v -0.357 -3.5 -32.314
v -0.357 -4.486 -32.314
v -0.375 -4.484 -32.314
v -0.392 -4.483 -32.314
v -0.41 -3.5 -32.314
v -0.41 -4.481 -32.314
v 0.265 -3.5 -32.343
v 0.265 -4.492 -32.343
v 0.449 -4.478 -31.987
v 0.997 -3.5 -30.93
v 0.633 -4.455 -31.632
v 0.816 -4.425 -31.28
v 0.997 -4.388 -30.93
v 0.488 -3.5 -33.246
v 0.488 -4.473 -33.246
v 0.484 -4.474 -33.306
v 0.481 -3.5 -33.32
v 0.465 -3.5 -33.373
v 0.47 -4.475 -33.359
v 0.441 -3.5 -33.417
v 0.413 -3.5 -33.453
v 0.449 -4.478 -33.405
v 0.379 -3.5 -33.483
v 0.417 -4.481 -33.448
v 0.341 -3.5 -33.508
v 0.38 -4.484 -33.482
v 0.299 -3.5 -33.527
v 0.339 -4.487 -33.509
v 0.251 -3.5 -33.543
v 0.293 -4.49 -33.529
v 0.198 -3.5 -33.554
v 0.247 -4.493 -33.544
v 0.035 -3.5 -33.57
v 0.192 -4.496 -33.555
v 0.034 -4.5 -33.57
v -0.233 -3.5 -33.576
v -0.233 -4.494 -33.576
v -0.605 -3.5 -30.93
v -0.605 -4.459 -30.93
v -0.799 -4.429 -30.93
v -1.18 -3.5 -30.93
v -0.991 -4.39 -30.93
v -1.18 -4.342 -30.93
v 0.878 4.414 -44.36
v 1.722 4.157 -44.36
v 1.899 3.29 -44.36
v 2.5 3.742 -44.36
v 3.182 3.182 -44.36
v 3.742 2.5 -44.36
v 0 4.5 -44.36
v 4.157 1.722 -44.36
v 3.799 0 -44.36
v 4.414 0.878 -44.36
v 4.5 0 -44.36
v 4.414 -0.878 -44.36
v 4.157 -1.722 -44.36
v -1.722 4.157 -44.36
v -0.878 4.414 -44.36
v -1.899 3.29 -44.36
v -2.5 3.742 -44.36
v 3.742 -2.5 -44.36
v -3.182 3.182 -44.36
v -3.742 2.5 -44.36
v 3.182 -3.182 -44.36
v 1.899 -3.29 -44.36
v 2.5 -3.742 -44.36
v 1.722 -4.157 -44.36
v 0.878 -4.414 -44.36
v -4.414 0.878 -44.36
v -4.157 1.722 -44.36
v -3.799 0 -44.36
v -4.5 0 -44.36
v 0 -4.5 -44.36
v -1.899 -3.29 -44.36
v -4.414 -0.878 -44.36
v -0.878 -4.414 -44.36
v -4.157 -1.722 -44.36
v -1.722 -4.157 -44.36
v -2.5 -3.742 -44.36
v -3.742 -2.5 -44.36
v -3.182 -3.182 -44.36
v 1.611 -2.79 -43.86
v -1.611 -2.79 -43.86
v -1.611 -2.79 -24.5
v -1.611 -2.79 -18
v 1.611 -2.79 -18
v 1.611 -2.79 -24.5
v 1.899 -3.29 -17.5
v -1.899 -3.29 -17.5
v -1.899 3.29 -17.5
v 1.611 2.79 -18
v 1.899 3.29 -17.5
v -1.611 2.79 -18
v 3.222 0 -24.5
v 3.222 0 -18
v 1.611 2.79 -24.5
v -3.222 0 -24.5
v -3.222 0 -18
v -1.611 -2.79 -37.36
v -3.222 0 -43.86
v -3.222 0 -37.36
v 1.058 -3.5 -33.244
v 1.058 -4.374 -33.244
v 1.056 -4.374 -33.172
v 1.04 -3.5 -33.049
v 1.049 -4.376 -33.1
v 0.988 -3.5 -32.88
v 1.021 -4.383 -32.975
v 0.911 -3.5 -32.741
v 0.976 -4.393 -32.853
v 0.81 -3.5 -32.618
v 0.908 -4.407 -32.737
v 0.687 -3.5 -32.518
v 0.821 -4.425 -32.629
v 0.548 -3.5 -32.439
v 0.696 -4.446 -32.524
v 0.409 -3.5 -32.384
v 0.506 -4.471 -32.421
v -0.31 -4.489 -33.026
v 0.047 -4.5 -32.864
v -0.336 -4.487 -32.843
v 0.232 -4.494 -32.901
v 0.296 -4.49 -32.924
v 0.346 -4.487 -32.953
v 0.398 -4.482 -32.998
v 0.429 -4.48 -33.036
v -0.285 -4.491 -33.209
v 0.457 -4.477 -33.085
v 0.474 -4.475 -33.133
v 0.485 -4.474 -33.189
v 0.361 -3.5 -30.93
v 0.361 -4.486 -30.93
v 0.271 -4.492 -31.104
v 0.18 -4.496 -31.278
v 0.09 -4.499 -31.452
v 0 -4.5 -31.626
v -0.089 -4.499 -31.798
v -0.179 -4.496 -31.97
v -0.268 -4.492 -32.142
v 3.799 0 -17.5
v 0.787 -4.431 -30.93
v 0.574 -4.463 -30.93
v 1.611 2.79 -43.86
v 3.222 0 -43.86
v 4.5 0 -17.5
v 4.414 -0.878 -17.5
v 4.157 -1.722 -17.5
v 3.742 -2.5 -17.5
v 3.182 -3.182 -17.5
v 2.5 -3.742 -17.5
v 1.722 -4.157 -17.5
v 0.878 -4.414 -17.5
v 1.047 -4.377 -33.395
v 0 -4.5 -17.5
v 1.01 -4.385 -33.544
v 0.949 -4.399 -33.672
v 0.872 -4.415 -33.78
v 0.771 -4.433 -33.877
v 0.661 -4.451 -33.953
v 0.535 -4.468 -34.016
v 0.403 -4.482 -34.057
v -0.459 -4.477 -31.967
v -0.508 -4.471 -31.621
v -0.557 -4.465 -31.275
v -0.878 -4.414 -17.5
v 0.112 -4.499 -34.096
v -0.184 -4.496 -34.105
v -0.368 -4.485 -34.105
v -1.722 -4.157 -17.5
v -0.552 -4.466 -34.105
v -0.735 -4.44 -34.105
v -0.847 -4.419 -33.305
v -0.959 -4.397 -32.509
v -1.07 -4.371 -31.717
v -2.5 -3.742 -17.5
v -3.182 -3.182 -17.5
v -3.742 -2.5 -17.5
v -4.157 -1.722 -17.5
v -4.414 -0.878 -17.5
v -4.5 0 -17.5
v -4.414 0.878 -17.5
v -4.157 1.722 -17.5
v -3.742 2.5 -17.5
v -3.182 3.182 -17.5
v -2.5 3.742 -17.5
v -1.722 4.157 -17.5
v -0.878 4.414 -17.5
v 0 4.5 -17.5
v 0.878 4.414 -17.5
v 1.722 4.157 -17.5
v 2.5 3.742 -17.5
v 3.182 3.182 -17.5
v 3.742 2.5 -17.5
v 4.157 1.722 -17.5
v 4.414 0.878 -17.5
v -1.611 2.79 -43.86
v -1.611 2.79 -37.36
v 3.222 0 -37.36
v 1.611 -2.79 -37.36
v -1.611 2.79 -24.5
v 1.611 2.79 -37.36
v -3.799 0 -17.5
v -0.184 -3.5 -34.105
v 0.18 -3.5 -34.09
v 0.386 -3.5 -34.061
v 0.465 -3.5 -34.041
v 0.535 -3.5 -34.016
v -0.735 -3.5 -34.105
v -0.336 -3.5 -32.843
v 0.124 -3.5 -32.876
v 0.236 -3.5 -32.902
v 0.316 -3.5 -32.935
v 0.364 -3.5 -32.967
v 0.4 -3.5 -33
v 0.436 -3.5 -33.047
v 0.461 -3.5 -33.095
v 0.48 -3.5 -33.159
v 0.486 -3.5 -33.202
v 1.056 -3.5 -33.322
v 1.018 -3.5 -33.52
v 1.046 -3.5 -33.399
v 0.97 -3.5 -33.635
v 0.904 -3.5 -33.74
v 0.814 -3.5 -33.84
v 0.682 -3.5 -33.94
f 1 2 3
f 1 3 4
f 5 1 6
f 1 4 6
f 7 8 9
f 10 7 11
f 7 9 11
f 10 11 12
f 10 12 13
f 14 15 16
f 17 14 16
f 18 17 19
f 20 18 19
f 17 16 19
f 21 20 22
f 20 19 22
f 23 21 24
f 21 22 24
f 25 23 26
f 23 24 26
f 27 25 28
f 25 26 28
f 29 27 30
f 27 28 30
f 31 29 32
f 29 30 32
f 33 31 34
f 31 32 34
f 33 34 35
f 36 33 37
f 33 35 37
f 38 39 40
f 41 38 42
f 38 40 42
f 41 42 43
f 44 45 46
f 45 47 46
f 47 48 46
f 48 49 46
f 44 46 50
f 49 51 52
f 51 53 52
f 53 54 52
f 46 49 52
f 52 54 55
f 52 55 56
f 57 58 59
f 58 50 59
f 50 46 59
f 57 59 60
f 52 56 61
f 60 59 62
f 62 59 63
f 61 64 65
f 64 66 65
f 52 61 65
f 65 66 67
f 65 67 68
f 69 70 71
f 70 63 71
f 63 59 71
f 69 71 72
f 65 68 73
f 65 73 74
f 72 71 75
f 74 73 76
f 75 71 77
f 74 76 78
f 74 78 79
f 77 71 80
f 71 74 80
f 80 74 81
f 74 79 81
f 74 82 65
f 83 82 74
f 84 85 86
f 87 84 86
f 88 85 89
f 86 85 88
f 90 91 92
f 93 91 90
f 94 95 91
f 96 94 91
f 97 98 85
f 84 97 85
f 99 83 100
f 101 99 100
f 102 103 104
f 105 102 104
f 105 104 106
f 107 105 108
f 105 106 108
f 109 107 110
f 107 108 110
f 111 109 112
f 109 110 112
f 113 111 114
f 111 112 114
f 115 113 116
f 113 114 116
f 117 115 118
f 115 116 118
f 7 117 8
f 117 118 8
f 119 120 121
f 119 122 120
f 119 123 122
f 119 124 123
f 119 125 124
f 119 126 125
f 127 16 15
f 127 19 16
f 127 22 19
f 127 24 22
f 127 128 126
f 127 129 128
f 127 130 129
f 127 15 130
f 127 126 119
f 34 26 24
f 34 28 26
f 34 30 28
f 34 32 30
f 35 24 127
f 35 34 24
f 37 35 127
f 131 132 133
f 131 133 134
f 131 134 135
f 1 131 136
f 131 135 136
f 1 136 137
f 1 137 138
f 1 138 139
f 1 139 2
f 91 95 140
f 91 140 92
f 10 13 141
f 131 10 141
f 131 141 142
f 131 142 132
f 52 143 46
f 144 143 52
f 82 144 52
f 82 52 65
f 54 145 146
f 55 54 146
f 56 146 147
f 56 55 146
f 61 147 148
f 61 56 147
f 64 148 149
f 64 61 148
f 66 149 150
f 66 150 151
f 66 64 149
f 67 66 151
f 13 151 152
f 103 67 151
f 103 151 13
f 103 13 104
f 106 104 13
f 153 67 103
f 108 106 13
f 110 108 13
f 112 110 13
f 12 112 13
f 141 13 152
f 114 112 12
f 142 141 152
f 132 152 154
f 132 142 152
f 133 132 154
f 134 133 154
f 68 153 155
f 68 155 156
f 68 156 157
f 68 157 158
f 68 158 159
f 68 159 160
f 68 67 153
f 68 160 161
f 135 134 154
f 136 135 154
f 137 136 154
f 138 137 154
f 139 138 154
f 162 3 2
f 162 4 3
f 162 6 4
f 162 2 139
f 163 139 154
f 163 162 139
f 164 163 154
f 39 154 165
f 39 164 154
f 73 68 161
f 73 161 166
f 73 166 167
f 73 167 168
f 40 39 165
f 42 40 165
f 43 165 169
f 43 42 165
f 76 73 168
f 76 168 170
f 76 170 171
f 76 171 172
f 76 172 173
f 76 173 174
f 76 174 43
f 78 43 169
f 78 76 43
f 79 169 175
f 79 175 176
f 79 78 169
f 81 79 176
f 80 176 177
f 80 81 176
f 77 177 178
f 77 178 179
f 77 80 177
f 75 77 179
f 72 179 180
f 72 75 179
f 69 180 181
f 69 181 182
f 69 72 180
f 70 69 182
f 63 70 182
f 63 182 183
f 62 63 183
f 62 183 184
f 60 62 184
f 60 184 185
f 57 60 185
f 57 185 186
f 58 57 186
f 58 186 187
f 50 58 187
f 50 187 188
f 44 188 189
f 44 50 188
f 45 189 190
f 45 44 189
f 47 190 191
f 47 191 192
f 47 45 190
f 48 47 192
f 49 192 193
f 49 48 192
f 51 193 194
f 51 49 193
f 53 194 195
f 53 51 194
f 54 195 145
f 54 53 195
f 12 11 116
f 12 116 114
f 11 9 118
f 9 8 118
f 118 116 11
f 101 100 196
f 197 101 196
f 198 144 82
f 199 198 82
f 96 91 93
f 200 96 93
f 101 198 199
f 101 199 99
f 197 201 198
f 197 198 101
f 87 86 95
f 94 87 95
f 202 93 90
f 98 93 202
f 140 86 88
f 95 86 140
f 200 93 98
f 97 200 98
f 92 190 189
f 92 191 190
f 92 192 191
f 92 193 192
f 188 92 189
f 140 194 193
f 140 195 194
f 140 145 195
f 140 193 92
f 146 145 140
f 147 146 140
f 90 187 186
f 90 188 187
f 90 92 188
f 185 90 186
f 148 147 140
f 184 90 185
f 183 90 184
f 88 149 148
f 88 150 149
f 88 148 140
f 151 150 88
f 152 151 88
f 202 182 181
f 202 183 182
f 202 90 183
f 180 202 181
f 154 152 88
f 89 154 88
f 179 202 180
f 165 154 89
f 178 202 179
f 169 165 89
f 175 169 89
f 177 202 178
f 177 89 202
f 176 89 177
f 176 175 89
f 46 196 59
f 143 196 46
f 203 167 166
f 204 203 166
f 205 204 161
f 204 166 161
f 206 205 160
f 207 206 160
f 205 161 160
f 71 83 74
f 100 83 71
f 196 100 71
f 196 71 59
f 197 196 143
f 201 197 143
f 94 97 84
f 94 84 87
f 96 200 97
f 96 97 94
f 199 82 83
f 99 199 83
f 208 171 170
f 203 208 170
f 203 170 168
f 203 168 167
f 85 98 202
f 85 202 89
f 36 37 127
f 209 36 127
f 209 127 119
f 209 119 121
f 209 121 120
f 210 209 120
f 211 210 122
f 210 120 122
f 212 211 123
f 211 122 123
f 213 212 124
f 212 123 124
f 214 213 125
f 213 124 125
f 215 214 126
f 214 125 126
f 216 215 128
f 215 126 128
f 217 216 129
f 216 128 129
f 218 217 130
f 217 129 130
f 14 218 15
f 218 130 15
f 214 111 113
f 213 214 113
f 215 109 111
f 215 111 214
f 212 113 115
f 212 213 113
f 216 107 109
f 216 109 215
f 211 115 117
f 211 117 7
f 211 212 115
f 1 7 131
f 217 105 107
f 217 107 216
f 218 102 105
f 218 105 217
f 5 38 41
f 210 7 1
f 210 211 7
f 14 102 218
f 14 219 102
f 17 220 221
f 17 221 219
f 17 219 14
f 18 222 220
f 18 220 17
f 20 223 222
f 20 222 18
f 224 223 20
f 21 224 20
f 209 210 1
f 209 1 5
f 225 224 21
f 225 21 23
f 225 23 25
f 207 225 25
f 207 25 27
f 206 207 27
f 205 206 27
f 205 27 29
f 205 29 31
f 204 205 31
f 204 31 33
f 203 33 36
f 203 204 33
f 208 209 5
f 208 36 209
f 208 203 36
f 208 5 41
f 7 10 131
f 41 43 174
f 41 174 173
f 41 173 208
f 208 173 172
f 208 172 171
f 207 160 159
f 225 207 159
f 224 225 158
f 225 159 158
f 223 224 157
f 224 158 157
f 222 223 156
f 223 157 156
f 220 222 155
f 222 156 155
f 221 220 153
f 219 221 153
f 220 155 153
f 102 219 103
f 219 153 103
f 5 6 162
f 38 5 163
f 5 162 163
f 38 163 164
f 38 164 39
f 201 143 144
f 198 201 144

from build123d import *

# Parameters (mm, degrees)
SKETCH1_W          = 4.5
SKETCH1_H          = 26.85997733
CUT_EXTRUDE1_DEPTH = 7
CUT_EXTRUDE2_DEPTH = 7
CHAMFER1_SIZE      = 0.5
CUT_EXTRUDE3_DEPTH = 1


with BuildPart() as part:
    # Sketch1 → Revolve-Thin1 (revolve)
    with BuildSketch(Plane(origin=(0, 0, 0), x_dir=(1, 0, 0), z_dir=(0, 1, 0))):
        with Locations((2.25, 30.929988665)):
            Rectangle(SKETCH1_W, SKETCH1_H)
    revolve(axis=Axis((0, 0, 0), (0, 0, -1)))

    # Sketch2 → Cut-Extrude1 (cut)
    with BuildSketch(Plane.XY.offset(-17.5)):
        Polygon((1.610807251, 2.79), (-1.610807251, 2.79), (-3.221614502, 0), (-1.610807251, -2.79), (1.610807251, -2.79), (3.221614502, 0), align=None)
    extrude(amount=-CUT_EXTRUDE1_DEPTH, mode=Mode.SUBTRACT)

    # Sketch3 → Cut-Extrude2 (cut)
    with BuildSketch(Plane(origin=(0, 0, -44.35997733), x_dir=(-1, 0, 0), z_dir=(0, 0, -1))):
        Polygon((1.610807251, 2.79), (-1.610807251, 2.79), (-3.221614502, 0), (-1.610807251, -2.79), (1.610807251, -2.79), (3.221614502, 0), align=None)
    extrude(amount=-CUT_EXTRUDE2_DEPTH, mode=Mode.SUBTRACT)

    # Chamfer1
    chamfer1_edges = [part.edges().sort_by_distance(p)[0] for p in [
        (2.416210877, 1.395, -17.5),
        (0, 2.79, -17.5),
        (-2.416210877, 1.395, -17.5),
        (-2.416210877, -1.395, -17.5),
        (0, -2.79, -17.5),
        (2.416210877, -1.395, -17.5),
        (-2.416210877, 1.395, -44.35997733),
        (0, 2.79, -44.35997733),
        (2.416210877, 1.395, -44.35997733),
        (2.416210877, -1.395, -44.35997733),
        (0, -2.79, -44.35997733),
        (-2.416210877, -1.395, -44.35997733),
    ]]
    chamfer(chamfer1_edges, length=CHAMFER1_SIZE)

    # Sketch4 → Cut-Extrude3 (cut)
    with BuildSketch(Plane(origin=(0, -4.5, 0), x_dir=(1, 0, 0), z_dir=(0, 1, 0))):
        with BuildLine():
            Line((-0.735236378, 34.104988665), (-0.183809095, 34.104988665))
            add(Edge.make_bspline(
                [(-0.183809095, 34.104988665), (-0.142887229, 34.104821435), (-0.063984952, 34.104498996), (0.049479088, 34.099913909), (0.153619775, 34.092996425), (0.248313279, 34.083867435), (0.333638661, 34.071201473), (0.40941848, 34.055993448), (0.47613676, 34.039057193), (0.516147477, 34.02331892), (0.534890825, 34.015946197)],
                knots=[0, 0, 0, 0, 0.000122758, 0.000236692, 0.000340599, 0.000435844, 0.000522015, 0.000599225, 0.000667726, 0.000728098, 0.000728098, 0.000728098, 0.000728098], degree=3))
            add(Edge.make_bspline(
                [(0.534890825, 34.015946197), (0.555993425, 34.006429933), (0.597245667, 33.987827142), (0.656357727, 33.95629427), (0.711711569, 33.922324809), (0.762389804, 33.884637999), (0.8094619, 33.84482071), (0.852635966, 33.802494227), (0.891564361, 33.757008969), (0.926655631, 33.709180776), (0.957858636, 33.659071505), (0.984643202, 33.606434054), (1.007803352, 33.551714066), (1.025889509, 33.49431609), (1.04092128, 33.434929127), (1.050643284, 33.373178483), (1.057485172, 33.309272455), (1.058047365, 33.265888615), (1.058333333, 33.243820796)],
                knots=[0, 0, 0, 0, 6.9431e-05, 0.000135726, 0.000200852, 0.000264074, 0.000324989, 0.000385705, 0.00044524, 0.000504393, 0.000563519, 0.000622115, 0.000681412, 0.000741551, 0.000802483, 0.00086501, 0.000928929, 0.000995103, 0.000995103, 0.000995103, 0.000995103], degree=3))
            add(Edge.make_bspline(
                [(1.058333333, 33.243820796), (1.057660809, 33.216664827), (1.056333136, 33.163054546), (1.047657842, 33.083998974), (1.031477343, 33.008136947), (1.009687089, 32.93522949), (0.982690716, 32.864804536), (0.947875359, 32.798087533), (0.907633136, 32.733916018), (0.861157476, 32.67313132), (0.809209736, 32.61517584), (0.749228296, 32.563460322), (0.684531415, 32.51450675), (0.612461254, 32.471597247), (0.53499992, 32.431738139), (0.45038063, 32.397967081), (0.360191554, 32.366801607), (0.296952619, 32.351203721), (0.264583333, 32.343219835)],
                knots=[0, 0, 0, 0, 8.1472e-05, 0.00016084, 0.000238178, 0.00031384, 0.000388957, 0.000464053, 0.000539224, 0.00061593, 0.000693367, 0.000772226, 0.000853128, 0.000936463, 0.001023502, 0.00111421, 0.001209545, 0.001309511, 0.001309511, 0.001309511, 0.001309511], degree=3))
            Line((0.264583333, 32.343219835), (0.997275641, 30.929988665))
            Line((0.997275641, 30.929988665), (0.360621995, 30.929988665))
            Line((0.360621995, 30.929988665), (-0.356805889, 32.313963024))
            Line((-0.356805889, 32.313963024), (-0.41023137, 32.313963024))
            Line((-0.41023137, 32.313963024), (-0.605488782, 30.929988665))
            Line((-0.605488782, 30.929988665), (-1.180448718, 30.929988665))
            Line((-1.180448718, 30.929988665), (-0.735236378, 34.104988665))
        make_face()
        with BuildLine():
            add(Edge.make_bspline(
                [(-0.335817308, 32.843129691), (-0.294894066, 32.843508532), (-0.2166182, 32.84423316), (-0.104827079, 32.849303715), (-0.004219131, 32.857224722), (0.08509361, 32.868749131), (0.16339231, 32.882182886), (0.230523904, 32.899038904), (0.286593934, 32.919072013), (0.332485643, 32.942831056), (0.369661123, 32.970726112), (0.40183809, 33.00049459), (0.428631207, 33.033817084), (0.450737928, 33.070134204), (0.467788114, 33.109521218), (0.480083934, 33.152244969), (0.486882391, 33.198020591), (0.487927508, 33.229595041), (0.488461538, 33.245728849)],
                knots=[0, 0, 0, 0, 0.000122766, 0.000234821, 0.000335651, 0.000425427, 0.000504898, 0.000573853, 0.000632811, 0.000683169, 0.0007282, 0.000771845, 0.000814359, 0.000856026, 0.000899036, 0.000942718, 0.000989043, 0.001037447, 0.001037447, 0.001037447, 0.001037447], degree=3))
            add(Edge.make_bspline(
                [(0.488461538, 33.245728849), (0.487770257, 33.264022258), (0.486429265, 33.299508964), (0.474830234, 33.35062006), (0.454996287, 33.39698474), (0.427122393, 33.438159863), (0.392337213, 33.474465682), (0.349901429, 33.504369125), (0.300298842, 33.527903238), (0.253836196, 33.543471254), (0.210053836, 33.552396101), (0.169082237, 33.558639509), (0.120514754, 33.564294057), (0.064292994, 33.568668304), (0.000652546, 33.571550346), (-0.070576621, 33.574306307), (-0.149461846, 33.575296954), (-0.204585812, 33.575641686), (-0.23341847, 33.575821998)],
                knots=[0, 0, 0, 0, 5.483e-05, 0.000106364, 0.000156221, 0.00020526, 0.000254739, 0.000306272, 0.000360034, 0.000418964, 0.000452769, 0.000493968, 0.000543275, 0.000599421, 0.000663102, 0.000734382, 0.000813258, 0.000899759, 0.000899759, 0.000899759, 0.000899759], degree=3))
            Line((-0.23341847, 33.575821998), (-0.335817308, 32.843129691))
        make_face(mode=Mode.SUBTRACT)
    extrude(amount=CUT_EXTRUDE3_DEPTH, mode=Mode.SUBTRACT)


solid = part.part
